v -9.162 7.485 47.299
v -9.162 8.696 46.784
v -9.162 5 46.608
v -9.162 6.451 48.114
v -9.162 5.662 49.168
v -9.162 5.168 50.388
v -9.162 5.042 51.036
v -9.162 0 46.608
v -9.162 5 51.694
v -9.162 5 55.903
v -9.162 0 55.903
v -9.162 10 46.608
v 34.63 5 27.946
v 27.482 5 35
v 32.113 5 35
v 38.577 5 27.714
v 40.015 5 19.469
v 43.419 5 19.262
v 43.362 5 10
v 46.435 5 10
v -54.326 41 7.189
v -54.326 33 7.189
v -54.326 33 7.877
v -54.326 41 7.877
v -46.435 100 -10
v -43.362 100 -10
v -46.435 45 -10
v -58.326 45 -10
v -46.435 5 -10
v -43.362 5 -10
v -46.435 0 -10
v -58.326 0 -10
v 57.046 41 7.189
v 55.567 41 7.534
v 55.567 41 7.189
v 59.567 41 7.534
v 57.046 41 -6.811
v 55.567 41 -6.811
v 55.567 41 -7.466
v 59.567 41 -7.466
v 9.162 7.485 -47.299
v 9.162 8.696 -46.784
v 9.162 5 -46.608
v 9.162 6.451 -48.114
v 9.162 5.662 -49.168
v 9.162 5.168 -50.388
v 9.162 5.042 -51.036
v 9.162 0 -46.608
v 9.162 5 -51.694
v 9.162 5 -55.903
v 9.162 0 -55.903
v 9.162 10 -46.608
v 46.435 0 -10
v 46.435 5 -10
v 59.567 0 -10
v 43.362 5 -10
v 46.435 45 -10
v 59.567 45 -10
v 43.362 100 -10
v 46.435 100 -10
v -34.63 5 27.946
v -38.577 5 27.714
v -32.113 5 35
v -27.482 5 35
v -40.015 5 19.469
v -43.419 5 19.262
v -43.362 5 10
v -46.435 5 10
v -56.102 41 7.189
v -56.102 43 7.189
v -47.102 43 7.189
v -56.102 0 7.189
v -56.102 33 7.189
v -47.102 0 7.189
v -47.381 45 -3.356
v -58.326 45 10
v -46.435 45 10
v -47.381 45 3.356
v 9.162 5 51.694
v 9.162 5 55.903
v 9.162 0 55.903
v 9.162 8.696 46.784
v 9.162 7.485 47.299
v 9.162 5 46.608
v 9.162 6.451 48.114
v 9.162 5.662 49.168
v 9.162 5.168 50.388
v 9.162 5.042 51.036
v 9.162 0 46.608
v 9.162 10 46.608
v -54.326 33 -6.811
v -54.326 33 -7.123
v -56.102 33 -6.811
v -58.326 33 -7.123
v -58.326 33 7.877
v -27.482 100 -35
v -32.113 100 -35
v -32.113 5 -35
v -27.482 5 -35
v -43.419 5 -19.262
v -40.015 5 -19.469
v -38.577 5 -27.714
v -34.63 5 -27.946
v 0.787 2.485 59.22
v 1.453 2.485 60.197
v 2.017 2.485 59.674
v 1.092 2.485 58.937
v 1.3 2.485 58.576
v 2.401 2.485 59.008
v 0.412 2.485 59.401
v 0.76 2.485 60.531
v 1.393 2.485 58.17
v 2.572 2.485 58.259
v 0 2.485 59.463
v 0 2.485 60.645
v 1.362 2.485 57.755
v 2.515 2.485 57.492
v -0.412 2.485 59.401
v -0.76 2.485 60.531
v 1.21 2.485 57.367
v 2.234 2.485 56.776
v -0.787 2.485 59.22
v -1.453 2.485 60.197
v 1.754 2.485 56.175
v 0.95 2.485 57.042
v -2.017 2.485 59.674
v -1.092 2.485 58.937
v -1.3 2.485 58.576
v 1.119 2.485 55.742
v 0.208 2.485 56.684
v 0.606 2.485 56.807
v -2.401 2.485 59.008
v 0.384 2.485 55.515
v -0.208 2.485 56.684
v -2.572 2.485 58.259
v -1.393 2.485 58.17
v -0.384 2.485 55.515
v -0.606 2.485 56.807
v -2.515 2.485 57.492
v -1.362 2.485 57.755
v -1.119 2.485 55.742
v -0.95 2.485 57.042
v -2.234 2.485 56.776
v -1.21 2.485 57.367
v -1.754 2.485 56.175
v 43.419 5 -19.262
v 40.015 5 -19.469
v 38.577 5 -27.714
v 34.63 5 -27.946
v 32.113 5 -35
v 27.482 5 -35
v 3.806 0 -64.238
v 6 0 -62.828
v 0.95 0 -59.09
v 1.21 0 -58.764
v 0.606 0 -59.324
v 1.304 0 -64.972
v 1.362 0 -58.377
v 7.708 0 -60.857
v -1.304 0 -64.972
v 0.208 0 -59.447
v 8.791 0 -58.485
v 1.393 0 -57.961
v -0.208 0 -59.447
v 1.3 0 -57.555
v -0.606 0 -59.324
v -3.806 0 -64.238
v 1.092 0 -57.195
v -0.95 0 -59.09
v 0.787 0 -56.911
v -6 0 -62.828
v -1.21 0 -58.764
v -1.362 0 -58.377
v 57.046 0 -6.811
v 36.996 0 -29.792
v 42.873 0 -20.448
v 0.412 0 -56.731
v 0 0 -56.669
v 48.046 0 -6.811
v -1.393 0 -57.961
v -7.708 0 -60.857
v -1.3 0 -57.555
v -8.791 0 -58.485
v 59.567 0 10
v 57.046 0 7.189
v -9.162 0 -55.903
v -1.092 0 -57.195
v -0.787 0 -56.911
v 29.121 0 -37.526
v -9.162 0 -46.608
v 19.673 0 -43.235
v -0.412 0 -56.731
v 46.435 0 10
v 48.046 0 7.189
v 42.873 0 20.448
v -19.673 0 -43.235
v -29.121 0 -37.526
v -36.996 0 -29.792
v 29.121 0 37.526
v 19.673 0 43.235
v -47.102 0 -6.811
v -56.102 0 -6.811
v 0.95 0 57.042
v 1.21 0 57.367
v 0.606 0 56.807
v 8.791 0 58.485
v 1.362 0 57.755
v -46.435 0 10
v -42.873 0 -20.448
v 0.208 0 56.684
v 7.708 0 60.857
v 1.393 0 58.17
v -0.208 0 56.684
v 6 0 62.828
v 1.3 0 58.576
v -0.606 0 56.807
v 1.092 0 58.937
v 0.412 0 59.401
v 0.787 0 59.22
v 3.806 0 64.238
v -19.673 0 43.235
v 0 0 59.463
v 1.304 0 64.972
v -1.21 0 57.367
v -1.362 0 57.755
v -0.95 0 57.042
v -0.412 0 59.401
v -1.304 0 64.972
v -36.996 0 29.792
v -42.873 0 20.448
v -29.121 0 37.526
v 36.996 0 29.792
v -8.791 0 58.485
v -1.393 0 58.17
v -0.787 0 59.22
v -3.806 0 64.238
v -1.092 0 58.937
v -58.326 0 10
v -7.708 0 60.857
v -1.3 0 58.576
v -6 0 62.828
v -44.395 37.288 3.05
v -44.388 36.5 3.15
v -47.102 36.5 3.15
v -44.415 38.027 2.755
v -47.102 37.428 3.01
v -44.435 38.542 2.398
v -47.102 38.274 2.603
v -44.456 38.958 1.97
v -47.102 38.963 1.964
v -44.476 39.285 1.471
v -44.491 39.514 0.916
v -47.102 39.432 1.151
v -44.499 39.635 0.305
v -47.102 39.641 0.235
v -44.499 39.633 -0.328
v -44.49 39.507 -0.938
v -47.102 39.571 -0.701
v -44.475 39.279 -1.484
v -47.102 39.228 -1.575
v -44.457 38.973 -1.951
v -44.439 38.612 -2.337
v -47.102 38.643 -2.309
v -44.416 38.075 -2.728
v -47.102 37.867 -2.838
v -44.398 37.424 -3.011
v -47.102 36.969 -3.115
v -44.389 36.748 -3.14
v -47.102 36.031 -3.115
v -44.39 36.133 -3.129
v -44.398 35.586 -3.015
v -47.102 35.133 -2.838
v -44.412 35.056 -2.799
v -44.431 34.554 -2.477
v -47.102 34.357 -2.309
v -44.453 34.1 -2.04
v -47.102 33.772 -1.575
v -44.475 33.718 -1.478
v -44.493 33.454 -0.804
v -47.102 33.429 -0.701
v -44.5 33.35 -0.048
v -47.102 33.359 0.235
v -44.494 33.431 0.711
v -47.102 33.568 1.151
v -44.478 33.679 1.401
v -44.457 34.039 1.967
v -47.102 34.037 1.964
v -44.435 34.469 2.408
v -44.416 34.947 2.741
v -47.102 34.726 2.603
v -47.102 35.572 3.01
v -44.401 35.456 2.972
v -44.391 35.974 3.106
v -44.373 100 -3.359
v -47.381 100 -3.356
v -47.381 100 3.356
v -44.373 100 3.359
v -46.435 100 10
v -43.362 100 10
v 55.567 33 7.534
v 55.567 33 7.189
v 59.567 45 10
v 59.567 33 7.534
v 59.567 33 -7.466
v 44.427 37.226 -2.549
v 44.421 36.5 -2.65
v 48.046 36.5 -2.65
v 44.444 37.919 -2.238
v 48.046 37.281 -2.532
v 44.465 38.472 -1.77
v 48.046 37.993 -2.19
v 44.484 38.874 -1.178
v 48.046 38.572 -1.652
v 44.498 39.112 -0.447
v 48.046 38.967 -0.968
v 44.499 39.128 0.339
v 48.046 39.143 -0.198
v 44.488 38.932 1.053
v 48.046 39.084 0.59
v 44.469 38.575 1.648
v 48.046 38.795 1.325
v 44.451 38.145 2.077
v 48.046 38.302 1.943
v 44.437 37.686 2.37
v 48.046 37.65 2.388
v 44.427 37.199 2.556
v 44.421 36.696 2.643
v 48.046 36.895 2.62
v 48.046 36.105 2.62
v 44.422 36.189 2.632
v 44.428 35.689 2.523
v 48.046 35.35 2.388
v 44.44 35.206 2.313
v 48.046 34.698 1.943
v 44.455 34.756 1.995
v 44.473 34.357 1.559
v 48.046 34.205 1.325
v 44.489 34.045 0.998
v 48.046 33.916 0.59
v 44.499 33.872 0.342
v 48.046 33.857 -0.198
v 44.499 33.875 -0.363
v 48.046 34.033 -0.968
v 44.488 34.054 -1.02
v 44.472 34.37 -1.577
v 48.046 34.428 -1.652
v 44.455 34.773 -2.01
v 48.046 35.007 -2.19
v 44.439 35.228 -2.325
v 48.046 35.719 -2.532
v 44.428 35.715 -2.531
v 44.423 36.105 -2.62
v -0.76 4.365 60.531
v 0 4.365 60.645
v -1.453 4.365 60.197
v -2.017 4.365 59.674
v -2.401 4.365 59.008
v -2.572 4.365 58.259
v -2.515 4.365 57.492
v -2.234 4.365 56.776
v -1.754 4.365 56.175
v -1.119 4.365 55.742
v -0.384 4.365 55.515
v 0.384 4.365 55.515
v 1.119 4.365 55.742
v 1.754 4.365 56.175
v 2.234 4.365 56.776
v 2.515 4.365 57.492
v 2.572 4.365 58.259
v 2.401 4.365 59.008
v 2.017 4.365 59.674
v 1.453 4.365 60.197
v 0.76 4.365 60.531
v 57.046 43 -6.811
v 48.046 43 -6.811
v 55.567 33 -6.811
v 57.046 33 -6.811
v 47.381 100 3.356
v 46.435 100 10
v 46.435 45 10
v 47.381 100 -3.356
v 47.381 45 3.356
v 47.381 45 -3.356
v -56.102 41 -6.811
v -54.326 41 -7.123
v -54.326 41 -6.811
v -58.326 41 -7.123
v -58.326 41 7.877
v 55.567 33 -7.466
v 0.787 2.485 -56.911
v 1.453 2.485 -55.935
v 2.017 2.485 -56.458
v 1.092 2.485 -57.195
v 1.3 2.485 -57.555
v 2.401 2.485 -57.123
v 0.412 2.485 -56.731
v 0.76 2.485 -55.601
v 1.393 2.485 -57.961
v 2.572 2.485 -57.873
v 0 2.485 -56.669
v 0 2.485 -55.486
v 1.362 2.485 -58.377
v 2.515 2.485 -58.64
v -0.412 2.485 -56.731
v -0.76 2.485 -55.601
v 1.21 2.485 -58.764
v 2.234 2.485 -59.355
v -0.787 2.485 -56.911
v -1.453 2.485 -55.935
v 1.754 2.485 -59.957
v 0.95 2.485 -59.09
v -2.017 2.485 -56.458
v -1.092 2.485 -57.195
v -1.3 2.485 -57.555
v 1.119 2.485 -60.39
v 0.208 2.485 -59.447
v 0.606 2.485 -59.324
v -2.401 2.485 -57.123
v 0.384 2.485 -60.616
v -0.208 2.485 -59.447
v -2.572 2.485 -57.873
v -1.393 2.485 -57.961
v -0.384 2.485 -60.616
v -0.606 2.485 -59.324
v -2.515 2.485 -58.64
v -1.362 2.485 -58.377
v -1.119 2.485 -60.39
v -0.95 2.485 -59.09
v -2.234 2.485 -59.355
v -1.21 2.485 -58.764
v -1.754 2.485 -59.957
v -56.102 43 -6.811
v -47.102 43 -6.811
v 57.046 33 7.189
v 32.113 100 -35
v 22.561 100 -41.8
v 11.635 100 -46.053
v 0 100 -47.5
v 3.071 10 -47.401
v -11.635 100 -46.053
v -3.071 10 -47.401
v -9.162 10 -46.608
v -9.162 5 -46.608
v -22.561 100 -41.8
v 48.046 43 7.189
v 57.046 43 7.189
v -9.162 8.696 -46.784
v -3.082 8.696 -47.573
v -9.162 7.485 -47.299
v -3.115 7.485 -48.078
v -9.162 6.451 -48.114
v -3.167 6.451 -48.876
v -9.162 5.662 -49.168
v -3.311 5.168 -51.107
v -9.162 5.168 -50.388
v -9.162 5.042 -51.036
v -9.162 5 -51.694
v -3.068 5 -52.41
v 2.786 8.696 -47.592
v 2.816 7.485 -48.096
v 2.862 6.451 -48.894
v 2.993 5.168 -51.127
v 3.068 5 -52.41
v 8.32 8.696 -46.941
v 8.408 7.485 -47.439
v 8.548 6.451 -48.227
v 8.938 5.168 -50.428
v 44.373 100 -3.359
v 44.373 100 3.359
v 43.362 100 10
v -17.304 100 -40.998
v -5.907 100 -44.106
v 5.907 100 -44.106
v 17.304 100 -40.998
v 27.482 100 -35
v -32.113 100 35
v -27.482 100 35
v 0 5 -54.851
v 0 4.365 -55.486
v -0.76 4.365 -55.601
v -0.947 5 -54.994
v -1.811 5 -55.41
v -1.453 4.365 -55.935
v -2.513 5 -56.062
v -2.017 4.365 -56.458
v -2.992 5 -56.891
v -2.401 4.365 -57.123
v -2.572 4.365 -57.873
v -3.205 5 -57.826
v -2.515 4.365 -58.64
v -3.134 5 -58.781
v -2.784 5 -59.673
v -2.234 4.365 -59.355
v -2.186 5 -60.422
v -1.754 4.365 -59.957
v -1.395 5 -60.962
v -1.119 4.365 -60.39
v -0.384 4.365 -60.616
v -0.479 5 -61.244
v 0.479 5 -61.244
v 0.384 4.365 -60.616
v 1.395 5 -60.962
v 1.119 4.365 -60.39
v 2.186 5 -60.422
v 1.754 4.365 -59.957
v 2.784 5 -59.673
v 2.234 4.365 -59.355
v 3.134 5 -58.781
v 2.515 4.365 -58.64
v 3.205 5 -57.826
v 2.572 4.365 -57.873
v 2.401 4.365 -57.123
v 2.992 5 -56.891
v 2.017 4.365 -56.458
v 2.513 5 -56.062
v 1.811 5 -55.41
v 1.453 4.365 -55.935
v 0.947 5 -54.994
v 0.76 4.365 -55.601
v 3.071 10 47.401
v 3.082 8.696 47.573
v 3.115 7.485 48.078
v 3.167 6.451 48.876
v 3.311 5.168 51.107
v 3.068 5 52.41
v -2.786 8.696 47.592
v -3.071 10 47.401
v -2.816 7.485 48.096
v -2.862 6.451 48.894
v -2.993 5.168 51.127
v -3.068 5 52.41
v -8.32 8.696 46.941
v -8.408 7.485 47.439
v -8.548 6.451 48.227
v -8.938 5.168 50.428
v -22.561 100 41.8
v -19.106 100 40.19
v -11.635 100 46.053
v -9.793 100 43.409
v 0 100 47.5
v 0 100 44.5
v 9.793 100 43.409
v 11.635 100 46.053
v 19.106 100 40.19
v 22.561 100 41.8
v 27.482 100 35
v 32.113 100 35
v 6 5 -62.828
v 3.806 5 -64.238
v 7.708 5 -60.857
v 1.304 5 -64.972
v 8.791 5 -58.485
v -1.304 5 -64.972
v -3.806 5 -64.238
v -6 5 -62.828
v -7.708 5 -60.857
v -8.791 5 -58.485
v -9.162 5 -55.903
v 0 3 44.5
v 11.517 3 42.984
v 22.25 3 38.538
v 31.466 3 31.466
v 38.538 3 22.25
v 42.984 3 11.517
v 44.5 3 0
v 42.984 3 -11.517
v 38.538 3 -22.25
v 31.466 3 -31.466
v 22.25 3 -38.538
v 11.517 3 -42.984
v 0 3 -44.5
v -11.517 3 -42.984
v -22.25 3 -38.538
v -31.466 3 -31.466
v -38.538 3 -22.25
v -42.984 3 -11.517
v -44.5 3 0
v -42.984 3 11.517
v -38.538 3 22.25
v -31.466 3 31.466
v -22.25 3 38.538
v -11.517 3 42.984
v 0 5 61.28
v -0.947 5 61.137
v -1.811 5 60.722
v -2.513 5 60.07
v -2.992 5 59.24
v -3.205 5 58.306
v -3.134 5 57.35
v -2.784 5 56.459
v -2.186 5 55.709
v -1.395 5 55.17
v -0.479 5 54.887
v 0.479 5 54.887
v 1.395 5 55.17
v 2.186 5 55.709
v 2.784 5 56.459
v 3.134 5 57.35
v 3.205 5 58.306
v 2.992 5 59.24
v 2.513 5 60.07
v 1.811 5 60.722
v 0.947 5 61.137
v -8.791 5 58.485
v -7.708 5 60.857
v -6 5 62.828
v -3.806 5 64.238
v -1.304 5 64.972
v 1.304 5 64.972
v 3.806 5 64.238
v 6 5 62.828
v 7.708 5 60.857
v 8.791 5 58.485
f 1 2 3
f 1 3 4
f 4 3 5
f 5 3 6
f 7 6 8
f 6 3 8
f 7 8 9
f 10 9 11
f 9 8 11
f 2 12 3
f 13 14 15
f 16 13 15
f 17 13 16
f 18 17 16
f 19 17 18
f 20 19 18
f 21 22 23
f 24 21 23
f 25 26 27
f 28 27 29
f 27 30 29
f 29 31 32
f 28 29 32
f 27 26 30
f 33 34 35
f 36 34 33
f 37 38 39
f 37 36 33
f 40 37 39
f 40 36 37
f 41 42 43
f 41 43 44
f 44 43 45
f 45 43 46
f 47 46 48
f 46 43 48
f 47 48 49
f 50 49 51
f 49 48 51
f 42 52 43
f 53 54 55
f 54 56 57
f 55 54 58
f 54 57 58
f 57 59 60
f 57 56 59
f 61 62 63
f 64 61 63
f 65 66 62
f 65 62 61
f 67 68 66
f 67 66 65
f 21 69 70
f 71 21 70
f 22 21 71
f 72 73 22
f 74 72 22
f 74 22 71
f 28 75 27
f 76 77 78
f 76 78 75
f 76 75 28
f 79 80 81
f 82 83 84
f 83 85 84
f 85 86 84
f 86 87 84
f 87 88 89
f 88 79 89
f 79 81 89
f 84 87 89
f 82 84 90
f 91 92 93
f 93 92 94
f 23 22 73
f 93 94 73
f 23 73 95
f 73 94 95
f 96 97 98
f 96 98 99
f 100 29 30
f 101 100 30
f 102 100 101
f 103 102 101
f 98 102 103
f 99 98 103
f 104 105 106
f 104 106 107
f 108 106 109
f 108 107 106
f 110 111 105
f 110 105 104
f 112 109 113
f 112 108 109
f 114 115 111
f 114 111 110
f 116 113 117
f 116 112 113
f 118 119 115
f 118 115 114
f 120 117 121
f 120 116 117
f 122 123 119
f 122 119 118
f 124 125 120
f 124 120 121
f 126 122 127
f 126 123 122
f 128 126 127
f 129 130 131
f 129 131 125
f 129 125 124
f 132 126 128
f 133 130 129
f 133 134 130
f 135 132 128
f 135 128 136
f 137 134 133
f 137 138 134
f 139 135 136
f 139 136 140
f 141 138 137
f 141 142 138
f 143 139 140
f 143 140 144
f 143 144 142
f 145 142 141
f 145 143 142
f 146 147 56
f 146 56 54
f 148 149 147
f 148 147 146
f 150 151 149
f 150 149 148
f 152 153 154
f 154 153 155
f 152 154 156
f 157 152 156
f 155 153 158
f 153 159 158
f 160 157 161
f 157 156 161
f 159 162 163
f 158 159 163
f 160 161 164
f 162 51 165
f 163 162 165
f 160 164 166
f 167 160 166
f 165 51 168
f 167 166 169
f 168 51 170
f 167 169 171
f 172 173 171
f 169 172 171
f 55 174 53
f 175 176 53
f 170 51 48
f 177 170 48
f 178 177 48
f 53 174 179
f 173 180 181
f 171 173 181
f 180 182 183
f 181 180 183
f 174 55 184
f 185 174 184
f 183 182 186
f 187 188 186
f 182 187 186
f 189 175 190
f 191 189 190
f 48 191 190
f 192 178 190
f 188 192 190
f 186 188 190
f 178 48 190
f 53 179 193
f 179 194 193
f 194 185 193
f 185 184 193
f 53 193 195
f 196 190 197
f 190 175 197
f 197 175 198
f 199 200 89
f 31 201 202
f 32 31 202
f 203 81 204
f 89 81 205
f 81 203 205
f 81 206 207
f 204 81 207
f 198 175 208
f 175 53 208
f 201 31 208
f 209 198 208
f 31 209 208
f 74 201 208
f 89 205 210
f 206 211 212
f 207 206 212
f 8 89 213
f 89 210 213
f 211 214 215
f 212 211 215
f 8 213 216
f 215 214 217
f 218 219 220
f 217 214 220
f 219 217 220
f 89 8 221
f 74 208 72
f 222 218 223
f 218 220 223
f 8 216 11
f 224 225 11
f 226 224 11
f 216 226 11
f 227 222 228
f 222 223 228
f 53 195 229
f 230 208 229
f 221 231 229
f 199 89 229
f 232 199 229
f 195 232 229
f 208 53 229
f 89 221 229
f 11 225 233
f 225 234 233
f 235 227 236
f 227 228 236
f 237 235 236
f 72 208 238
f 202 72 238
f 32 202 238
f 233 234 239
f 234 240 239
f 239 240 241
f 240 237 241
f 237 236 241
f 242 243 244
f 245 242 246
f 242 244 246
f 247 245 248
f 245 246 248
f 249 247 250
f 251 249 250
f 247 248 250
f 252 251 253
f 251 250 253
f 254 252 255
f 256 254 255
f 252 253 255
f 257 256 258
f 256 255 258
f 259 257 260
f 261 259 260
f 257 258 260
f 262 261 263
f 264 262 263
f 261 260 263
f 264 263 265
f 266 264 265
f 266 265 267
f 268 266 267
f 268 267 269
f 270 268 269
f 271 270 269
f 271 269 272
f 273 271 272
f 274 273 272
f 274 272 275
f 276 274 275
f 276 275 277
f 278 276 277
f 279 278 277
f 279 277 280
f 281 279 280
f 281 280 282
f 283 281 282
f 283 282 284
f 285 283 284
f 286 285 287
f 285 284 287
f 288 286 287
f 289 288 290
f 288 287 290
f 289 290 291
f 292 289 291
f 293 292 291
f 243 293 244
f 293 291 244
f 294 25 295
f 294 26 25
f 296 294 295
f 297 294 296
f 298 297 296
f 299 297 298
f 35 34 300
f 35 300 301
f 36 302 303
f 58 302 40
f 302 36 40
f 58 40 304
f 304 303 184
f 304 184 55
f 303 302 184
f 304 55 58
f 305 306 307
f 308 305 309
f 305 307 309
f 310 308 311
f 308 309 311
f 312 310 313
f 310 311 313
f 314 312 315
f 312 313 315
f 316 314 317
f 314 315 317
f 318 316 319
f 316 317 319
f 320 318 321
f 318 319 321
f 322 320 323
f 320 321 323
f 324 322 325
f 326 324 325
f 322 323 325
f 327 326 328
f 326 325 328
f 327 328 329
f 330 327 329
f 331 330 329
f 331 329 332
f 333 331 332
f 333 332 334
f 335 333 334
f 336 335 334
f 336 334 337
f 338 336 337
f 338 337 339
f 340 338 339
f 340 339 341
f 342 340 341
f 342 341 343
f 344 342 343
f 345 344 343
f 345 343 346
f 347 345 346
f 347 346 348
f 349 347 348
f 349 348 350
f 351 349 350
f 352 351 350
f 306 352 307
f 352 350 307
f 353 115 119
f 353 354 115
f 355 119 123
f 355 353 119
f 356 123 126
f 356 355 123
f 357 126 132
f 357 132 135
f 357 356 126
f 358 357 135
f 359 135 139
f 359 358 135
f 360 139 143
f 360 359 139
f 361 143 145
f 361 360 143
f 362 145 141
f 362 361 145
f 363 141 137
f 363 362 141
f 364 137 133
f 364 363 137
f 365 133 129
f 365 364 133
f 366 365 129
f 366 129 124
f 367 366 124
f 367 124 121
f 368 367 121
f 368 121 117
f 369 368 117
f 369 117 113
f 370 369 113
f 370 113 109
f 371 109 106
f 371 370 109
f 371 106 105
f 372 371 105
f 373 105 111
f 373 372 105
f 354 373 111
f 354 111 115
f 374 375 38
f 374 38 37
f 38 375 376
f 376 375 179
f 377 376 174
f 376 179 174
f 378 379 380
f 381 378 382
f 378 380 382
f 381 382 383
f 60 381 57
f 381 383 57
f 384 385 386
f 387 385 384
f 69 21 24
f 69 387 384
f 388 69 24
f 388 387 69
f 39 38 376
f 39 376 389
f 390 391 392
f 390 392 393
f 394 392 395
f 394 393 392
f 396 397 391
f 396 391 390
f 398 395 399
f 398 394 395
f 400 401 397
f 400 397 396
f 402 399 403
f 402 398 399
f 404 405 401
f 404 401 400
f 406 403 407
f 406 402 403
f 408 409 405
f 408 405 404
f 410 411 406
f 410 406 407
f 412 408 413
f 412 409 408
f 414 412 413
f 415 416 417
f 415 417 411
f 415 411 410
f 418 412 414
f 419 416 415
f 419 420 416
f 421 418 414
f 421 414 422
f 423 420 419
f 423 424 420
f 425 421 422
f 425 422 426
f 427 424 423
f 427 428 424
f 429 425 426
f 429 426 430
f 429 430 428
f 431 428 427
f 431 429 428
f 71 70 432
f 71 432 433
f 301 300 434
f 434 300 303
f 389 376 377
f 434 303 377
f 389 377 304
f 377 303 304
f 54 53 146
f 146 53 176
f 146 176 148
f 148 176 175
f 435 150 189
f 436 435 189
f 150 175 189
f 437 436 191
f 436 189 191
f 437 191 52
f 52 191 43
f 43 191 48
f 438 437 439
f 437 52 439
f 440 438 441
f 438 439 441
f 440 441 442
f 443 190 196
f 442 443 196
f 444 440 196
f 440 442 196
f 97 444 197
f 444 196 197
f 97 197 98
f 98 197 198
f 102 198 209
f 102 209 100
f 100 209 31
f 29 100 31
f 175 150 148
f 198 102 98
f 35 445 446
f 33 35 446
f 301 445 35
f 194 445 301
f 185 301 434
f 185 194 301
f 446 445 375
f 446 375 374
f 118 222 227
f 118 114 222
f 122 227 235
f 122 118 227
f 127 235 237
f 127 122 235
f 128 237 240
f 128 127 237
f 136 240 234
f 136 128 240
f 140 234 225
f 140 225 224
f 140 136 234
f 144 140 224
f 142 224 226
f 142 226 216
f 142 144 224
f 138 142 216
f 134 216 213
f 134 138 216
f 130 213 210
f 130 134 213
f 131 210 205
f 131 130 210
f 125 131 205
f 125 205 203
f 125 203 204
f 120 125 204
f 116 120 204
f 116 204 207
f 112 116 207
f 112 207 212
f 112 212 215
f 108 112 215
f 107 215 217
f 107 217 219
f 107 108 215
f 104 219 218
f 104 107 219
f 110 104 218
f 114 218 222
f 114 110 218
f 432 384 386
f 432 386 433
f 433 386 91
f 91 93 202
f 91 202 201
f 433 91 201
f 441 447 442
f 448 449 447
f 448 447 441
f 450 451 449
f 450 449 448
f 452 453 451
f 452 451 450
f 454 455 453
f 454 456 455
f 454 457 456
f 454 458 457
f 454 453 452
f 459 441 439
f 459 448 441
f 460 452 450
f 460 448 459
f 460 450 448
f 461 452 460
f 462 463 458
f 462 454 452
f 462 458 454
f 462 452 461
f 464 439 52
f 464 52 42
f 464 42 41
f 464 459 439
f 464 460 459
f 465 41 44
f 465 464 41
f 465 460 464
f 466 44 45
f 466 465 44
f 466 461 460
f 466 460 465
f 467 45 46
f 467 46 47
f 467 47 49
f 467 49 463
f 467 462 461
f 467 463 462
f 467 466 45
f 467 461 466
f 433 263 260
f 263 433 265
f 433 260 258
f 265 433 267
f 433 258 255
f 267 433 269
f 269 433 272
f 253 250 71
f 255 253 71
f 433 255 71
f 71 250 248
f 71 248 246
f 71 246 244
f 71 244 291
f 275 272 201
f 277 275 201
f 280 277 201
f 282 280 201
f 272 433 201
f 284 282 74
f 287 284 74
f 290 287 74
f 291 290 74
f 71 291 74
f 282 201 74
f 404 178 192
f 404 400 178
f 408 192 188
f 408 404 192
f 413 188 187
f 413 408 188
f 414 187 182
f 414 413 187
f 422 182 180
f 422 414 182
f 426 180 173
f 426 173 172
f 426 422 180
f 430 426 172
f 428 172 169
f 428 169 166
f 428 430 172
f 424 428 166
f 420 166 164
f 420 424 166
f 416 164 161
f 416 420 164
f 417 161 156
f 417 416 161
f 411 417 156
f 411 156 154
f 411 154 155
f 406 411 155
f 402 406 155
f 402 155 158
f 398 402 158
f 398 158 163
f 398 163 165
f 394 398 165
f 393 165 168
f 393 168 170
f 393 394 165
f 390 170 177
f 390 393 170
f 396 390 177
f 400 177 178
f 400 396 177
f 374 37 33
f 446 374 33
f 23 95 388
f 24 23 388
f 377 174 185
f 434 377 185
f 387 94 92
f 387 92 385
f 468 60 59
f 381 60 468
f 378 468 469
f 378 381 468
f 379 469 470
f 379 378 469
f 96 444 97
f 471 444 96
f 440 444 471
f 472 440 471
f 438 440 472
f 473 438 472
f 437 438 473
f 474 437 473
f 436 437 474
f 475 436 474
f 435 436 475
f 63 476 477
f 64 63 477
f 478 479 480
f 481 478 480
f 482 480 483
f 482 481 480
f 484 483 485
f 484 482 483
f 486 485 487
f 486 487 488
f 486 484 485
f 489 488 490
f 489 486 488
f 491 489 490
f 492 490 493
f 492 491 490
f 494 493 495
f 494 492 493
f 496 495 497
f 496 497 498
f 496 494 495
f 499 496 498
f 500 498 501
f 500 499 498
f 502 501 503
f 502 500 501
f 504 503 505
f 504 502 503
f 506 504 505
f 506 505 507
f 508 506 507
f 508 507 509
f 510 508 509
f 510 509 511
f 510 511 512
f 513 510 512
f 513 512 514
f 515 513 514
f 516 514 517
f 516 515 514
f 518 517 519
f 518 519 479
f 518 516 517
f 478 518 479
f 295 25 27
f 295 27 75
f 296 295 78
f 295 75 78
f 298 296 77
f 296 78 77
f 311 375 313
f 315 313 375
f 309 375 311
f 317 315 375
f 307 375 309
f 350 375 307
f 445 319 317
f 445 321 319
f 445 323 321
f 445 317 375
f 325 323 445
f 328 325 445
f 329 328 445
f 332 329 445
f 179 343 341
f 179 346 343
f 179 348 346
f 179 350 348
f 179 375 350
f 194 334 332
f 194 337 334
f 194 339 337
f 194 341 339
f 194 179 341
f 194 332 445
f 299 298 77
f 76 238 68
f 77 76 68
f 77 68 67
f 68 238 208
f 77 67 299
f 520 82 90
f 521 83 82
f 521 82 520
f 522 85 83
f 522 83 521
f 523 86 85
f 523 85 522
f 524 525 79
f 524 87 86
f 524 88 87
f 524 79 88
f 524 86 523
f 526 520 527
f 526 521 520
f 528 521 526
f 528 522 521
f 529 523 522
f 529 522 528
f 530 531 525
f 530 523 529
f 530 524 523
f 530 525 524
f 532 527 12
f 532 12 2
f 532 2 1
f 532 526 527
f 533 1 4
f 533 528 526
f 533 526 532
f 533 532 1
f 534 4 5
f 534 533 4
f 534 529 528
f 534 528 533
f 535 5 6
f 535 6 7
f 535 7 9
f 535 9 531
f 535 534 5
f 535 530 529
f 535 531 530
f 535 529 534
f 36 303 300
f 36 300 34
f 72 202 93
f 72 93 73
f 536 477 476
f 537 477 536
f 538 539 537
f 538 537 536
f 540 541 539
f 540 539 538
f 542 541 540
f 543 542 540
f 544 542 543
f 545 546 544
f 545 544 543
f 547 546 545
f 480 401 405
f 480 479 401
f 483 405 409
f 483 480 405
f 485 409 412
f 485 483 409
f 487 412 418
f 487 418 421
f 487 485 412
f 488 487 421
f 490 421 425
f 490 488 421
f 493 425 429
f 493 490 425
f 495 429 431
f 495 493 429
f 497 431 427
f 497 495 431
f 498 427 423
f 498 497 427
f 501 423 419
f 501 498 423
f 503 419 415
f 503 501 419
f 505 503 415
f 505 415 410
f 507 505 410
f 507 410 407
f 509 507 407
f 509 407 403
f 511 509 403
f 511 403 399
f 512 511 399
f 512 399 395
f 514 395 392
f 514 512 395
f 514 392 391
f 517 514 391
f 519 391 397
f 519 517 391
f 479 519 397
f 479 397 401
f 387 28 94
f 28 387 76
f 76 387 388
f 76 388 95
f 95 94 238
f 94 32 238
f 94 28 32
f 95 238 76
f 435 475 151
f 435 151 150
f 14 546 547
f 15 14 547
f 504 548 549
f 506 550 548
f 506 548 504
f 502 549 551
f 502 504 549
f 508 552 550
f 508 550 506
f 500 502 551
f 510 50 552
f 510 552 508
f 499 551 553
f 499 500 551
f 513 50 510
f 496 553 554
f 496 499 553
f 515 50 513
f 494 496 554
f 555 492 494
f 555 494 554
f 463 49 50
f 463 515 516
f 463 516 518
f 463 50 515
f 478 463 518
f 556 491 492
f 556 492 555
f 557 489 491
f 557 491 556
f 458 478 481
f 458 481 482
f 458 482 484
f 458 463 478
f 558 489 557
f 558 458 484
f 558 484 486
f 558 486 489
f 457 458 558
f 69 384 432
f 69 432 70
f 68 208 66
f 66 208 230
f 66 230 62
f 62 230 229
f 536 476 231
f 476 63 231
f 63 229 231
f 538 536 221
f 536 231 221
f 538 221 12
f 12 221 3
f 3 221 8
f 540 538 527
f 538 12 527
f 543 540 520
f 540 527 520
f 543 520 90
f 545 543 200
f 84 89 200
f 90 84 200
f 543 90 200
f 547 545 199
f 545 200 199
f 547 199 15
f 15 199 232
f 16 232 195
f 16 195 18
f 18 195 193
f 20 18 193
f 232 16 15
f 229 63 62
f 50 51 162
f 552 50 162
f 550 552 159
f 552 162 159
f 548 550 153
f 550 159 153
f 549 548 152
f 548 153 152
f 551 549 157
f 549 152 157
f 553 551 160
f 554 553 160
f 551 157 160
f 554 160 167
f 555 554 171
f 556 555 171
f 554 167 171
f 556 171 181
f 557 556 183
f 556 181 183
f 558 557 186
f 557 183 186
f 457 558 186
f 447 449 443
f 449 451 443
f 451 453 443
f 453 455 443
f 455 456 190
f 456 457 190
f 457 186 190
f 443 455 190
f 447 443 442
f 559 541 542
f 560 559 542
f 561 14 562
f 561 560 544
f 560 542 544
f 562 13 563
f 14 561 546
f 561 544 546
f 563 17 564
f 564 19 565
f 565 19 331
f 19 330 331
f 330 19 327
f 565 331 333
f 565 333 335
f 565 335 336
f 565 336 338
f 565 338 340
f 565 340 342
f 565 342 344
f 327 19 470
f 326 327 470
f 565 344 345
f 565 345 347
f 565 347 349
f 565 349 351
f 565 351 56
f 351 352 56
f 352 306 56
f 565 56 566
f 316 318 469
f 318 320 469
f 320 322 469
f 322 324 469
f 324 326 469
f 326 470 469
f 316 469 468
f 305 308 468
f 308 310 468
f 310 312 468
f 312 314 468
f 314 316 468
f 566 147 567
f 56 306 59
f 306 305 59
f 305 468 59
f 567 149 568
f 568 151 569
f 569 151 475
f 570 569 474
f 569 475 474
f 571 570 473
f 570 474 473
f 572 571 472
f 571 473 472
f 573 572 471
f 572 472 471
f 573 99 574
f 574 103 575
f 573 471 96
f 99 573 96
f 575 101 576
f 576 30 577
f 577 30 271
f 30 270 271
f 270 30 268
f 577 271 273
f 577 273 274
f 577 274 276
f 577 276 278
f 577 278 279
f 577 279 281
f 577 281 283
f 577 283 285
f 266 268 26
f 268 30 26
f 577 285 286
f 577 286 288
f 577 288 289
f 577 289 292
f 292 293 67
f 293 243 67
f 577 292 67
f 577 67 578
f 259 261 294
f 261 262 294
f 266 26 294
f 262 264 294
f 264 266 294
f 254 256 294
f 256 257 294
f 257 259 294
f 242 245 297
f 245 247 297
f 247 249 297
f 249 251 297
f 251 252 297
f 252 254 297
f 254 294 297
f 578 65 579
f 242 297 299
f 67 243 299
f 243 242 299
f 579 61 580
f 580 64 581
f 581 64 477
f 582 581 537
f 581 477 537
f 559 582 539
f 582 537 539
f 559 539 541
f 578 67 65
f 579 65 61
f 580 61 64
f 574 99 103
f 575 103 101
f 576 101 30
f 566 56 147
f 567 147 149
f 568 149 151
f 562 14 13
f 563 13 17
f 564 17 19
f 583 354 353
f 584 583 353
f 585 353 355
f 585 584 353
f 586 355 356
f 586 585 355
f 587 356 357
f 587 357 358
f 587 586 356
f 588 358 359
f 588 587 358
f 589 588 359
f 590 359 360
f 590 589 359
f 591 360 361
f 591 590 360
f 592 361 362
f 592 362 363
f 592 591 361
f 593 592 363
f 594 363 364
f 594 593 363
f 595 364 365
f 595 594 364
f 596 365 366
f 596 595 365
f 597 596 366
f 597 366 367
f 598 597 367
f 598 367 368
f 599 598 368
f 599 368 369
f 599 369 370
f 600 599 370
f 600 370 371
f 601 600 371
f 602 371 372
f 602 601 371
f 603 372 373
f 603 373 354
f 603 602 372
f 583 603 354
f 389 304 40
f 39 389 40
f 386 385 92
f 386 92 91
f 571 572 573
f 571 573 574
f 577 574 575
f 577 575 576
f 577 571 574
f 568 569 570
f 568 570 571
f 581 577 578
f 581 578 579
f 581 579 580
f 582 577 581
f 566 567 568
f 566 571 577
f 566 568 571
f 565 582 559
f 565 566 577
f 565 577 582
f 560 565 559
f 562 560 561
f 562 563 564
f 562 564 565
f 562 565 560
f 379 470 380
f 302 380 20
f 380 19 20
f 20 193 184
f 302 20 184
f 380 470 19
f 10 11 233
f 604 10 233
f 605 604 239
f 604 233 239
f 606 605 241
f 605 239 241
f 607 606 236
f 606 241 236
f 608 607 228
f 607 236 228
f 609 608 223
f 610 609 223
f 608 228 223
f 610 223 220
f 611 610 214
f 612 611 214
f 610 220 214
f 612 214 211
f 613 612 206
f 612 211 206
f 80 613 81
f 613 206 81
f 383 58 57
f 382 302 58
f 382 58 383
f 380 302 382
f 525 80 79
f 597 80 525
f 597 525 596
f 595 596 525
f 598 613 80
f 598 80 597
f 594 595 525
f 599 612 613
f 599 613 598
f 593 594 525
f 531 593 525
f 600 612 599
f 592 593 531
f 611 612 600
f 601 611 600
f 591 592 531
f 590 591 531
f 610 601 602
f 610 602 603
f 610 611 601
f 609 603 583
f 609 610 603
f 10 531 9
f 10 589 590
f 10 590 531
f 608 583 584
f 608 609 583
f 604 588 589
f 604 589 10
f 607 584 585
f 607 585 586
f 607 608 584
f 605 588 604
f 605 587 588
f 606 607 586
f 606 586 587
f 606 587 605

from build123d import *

# Parameters (mm, degrees)
SKETCH2_R                                     = 47.5
BOSS_EXTRUDE2_DEPTH                           = 100
SKETCH3_R                                     = 44.5
CUT_EXTRUDE1_DEPTH                            = 97
SKETCH4_W                                     = 145.572703988
SKETCH4_H                                     = 25
SKETCH4_W_2                                   = 159.095851353
CUT_EXTRUDE3_DEPTH                            = 95
BOSS_EXTRUDE3_DEPTH                           = 5
FILLET1_R                                     = 5
CBORE_FOR_3_SOCKET_HEAD_CAP_SCREW1_AT_2_COUNT = 2
CBORE_FOR_3_SOCKET_HEAD_CAP_SCREW1_AT_2_PITCH = 116.131492307
BOSS_EXTRUDE4_DEPTH                           = 45
SKETCH10_W                                    = 9
SKETCH10_H                                    = 14
CUT_EXTRUDE4_DEPTH                            = 43
SKETCH11_W                                    = 15
SKETCH11_H                                    = 8
CUT_EXTRUDE5_DEPTH                            = 4
SKETCH12_W                                    = 15
SKETCH12_H                                    = 8
CUT_EXTRUDE6_DEPTH                            = 4
CUT_EXTRUDE7_REACH                            = 169.726
CUT_EXTRUDE7_END_RADIUS                       = 44.5
SKETCH13_R                                    = 3.15
CUT_EXTRUDE8_REACH                            = 161.839
CUT_EXTRUDE8_END_RADIUS                       = 44.5
SKETCH14_R                                    = 2.65


with BuildPart() as part:
    # Sketch2 → Boss-Extrude2 (new body)
    with BuildSketch(Plane(origin=(0, 0, 0), x_dir=(1, 0, 0), z_dir=(0, 1, 0))):
        with Locations(Location((0, 0, 0), (0, 0, 270))):
            Circle(SKETCH2_R)
    extrude(amount=BOSS_EXTRUDE2_DEPTH)

    # Sketch3 → Cut-Extrude1 (cut)
    with BuildSketch(Plane(origin=(0, 100, 0), x_dir=(1, 0, 0), z_dir=(0, 1, 0))):
        with Locations(Location((0, 0, 0), (0, 0, 270))):
            Circle(SKETCH3_R)
    extrude(amount=-CUT_EXTRUDE1_DEPTH, mode=Mode.SUBTRACT)

    # Sketch4 → Cut-Extrude3 (cut)
    with BuildSketch(Plane(origin=(0, 100, 0), x_dir=(1, 0, 0), z_dir=(0, 1, 0))):
        with Locations((2.391411924, -22.5)):
            Rectangle(SKETCH4_W, SKETCH4_H)
        with Locations((9.152985607, 22.5)):
            Rectangle(SKETCH4_W_2, SKETCH4_H)
    extrude(amount=-CUT_EXTRUDE3_DEPTH, mode=Mode.SUBTRACT)

    # Sketch5 → Boss-Extrude3 (add)
    with BuildSketch(Plane.XZ):
        with BuildLine():
            Line((-9.162255845, 46.607972149), (-9.162255845, 55.903490308))
            ThreePointArc((-9.162255845, 55.903490308), (0, 65.065746153), (9.162255845, 55.903490308))
            Line((9.162255845, 55.903490308), (9.162255845, 46.607972149))
            ThreePointArc((9.162255845, 46.607972149), (0, 47.5), (-9.162255845, 46.607972149))
        make_face()
        with BuildLine():
            Line((9.162255845, -46.607972149), (9.162255845, -55.903490308))
            ThreePointArc((9.162255845, -55.903490308), (0, -65.065746153), (-9.162255845, -55.903490308))
            Line((-9.162255845, -55.903490308), (-9.162255845, -46.607972149))
            ThreePointArc((-9.162255845, -46.607972149), (0, -47.5), (9.162255845, -46.607972149))
        make_face()
    extrude(amount=-BOSS_EXTRUDE3_DEPTH)

    # Fillet1
    fillet1_edges = [part.edges().sort_by_distance(p)[0] for p in [
        (0, 5, -47.5),
        (4.602788445, 5, 47.276467069),
    ]]
    fillet(fillet1_edges, radius=FILLET1_R)

    # Sketch8 → CBORE for #3 Socket Head Cap Screw1 (revolve, cut)
    with BuildSketch(Plane(origin=(0, 5, 58.065746153), x_dir=(0, 0, 1), z_dir=(1, 0, 0))):
        Polygon((0, 0), (0, 5), (1.397, 5), (1.397, 2.5146), (2.57937, 2.5146), (2.57937, 0.635), (3.21437, 0), align=None)
    cbore_for_3_socket_head_cap_screw1 = revolve(axis=Axis((0, 11.35, 58.065746153), (0, -1, 0)), mode=Mode.SUBTRACT)

    # CBORE for #3 Socket Head Cap Screw1 at 2: CBORE for #3 Socket Head Cap Screw1 ×2
    with Locations(*[(0, 0, -i * CBORE_FOR_3_SOCKET_HEAD_CAP_SCREW1_AT_2_PITCH) for i in range(1, CBORE_FOR_3_SOCKET_HEAD_CAP_SCREW1_AT_2_COUNT)]):
        add(cbore_for_3_socket_head_cap_screw1, mode=Mode.SUBTRACT)

    # Sketch9 → Boss-Extrude4 (add)
    with BuildSketch(Plane.XZ):
        with BuildLine():
            Line((-58.325612467, 10), (-46.435439053, 10))
            ThreePointArc((-46.435439053, 10), (-47.5, 0), (-46.435439053, -10))
            Line((-46.435439053, -10), (-58.325612467, -10))
            Line((-58.325612467, -10), (-58.325612467, 10))
        make_face()
        with BuildLine():
            Line((46.435439053, 10), (59.566582945, 10))
            Line((59.566582945, 10), (59.566582945, -10))
            Line((59.566582945, -10), (46.435439053, -10))
            ThreePointArc((46.435439053, -10), (47.5, 0), (46.435439053, 10))
        make_face()
    extrude(amount=-BOSS_EXTRUDE4_DEPTH)

    # Sketch10 → Cut-Extrude4 (cut)
    with BuildSketch(Plane.XZ):
        with Locations((-51.602219379, 0.189273316)):
            Rectangle(SKETCH10_W, SKETCH10_H)
        with Locations((52.545961871, 0.189273316)):
            Rectangle(SKETCH10_W, SKETCH10_H)
    extrude(amount=-CUT_EXTRUDE4_DEPTH, mode=Mode.SUBTRACT)

    # Sketch11 → Cut-Extrude5 (cut)
    with BuildSketch(Plane(origin=(59.566582945, 0, 0), x_dir=(0, 0, -1), z_dir=(1, 0, 0))):
        with Locations((-0.034463617, 37)):
            Rectangle(SKETCH11_W, SKETCH11_H)
    extrude(amount=-CUT_EXTRUDE5_DEPTH, mode=Mode.SUBTRACT)

    # Sketch12 → Cut-Extrude6 (cut)
    with BuildSketch(Plane.ZY.offset(58.325612467)):
        with Locations((0.376507126, 37)):
            Rectangle(SKETCH12_W, SKETCH12_H)
    extrude(amount=-CUT_EXTRUDE6_DEPTH, mode=Mode.SUBTRACT)

    # Cut-Extrude7: up to this cylinder (the profile starts outside it)
    cut_extrude7_end = Plane(origin=(0, 36.5, 0), z_dir=(0, 1, 0)) * Cylinder(CUT_EXTRUDE7_END_RADIUS, 429.452, mode=Mode.PRIVATE)
    # Sketch13 → Cut-Extrude7 (cut, up to the surface)
    with BuildSketch(Plane.ZY.offset(58.325612467), mode=Mode.PRIVATE) as cut_extrude7_sk1:
        with Locations((0, 36.5)):
            Circle(SKETCH13_R)
    cut_extrude7_tool1 = extrude(cut_extrude7_sk1.sketch, amount=-CUT_EXTRUDE7_REACH, mode=Mode.PRIVATE) - cut_extrude7_end
    add(cut_extrude7_tool1.solids().sort_by_distance((-58.325612, 36.5, 0))[0], mode=Mode.SUBTRACT)

    # Cut-Extrude8: up to this cylinder (the profile starts outside it)
    cut_extrude8_end = Plane(origin=(0, 36.5, 0), z_dir=(0, 1, 0)) * Cylinder(CUT_EXTRUDE8_END_RADIUS, 413.678, mode=Mode.PRIVATE)
    # Sketch14 → Cut-Extrude8 (cut, up to the surface)
    with BuildSketch(Plane(origin=(48.045961871, 0, 0), x_dir=(0, 0, -1), z_dir=(1, 0, 0)), mode=Mode.PRIVATE) as cut_extrude8_sk1:
        with Locations((0, 36.5)):
            Circle(SKETCH14_R)
    cut_extrude8_tool1 = extrude(cut_extrude8_sk1.sketch, amount=-CUT_EXTRUDE8_REACH, mode=Mode.PRIVATE) - cut_extrude8_end
    add(cut_extrude8_tool1.solids().sort_by_distance((48.045962, 36.5, 0))[0], mode=Mode.SUBTRACT)


solid = part.part
